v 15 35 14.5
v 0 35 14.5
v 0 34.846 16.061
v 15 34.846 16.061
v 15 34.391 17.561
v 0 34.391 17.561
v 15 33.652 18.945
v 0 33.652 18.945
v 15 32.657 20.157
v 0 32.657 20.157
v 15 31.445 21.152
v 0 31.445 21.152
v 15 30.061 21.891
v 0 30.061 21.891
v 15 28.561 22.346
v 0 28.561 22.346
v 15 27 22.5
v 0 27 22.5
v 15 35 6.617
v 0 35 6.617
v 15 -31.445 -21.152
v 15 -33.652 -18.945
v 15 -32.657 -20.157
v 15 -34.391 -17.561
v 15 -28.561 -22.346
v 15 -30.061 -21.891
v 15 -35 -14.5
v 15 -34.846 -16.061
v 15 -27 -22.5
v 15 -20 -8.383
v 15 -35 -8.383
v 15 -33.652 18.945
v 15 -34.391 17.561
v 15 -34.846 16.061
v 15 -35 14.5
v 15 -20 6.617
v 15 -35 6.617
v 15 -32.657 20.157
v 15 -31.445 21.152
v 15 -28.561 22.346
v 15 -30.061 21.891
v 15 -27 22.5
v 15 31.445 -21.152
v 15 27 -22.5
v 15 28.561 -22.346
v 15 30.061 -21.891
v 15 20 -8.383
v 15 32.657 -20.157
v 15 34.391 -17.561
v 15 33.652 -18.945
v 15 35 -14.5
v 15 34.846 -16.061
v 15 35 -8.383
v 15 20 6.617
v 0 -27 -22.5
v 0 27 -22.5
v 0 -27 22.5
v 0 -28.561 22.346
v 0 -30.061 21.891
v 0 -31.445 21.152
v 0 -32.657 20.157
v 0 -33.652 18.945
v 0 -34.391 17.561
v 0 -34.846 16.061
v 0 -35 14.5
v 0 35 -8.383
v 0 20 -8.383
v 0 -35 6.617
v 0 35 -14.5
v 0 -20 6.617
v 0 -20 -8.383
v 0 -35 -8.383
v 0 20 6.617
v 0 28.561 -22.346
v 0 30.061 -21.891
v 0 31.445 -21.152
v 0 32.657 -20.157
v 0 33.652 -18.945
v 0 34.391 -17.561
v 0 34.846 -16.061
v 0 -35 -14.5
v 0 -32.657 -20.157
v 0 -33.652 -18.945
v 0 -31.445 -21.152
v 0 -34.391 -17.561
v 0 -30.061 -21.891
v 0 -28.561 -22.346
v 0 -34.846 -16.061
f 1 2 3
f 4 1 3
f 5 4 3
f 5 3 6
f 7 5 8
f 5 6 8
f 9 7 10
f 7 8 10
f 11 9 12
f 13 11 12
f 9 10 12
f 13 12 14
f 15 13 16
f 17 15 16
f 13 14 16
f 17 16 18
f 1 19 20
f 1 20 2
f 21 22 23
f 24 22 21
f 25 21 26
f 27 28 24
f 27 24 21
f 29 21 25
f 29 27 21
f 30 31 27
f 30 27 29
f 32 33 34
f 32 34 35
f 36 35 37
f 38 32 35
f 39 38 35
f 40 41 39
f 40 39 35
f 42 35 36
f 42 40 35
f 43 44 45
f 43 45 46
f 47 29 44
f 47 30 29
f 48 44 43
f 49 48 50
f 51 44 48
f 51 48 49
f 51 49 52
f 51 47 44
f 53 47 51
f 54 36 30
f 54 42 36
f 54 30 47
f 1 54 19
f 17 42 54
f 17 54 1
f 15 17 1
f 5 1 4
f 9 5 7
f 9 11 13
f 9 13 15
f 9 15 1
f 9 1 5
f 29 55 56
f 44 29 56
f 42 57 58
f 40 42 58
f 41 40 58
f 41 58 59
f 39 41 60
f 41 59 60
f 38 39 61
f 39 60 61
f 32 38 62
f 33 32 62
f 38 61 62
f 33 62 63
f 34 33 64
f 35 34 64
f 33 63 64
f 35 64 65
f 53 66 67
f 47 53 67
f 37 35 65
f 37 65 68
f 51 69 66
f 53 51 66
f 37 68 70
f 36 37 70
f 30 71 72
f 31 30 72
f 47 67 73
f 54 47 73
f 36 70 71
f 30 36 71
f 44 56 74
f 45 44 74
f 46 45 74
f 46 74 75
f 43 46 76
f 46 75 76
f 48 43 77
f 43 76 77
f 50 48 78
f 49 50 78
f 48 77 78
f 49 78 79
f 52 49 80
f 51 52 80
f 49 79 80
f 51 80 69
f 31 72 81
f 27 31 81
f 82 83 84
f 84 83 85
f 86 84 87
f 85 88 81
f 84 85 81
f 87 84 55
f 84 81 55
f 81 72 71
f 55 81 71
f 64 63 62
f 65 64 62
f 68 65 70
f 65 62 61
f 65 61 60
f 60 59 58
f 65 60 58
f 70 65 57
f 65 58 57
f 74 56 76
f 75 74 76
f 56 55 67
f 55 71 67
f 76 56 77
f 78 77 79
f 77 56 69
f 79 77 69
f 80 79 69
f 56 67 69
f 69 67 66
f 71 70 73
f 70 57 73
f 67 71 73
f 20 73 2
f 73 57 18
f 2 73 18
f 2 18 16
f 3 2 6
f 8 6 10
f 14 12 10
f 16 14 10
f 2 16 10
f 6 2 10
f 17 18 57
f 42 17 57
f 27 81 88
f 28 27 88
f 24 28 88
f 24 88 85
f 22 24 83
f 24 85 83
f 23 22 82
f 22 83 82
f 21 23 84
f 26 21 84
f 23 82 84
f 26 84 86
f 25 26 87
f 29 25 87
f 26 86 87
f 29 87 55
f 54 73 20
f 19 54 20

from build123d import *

# Parameters (mm, degrees)
F1_DEPTH = 15


with BuildPart() as f1:
    # F0 (on Right) → F1 (new body)
    with BuildSketch(Plane.YZ):
        with BuildLine():
            ThreePointArc((35, 14.5), (32.656854, 20.156854), (27, 22.5))
            Line((27, 22.5), (-27, 22.5))
            ThreePointArc((-27, 22.5), (-32.656854, 20.156854), (-35, 14.5))
            Line((-35, 14.5), (-35, 6.617025))
            Line((-35, 6.617025), (-20, 6.617025))
            Line((-20, 6.617025), (-20, -8.382975))
            Line((-20, -8.382975), (-35, -8.382975))
            Line((-35, -8.382975), (-35, -14.5))
            ThreePointArc((-35, -14.5), (-32.656854, -20.156854), (-27, -22.5))
            Line((-27, -22.5), (27, -22.5))
            ThreePointArc((27, -22.5), (32.656854, -20.156854), (35, -14.5))
            Line((35, -14.5), (35, -8.382975))
            Line((35, -8.382975), (20, -8.382975))
            Line((20, -8.382975), (20, 6.617025))
            Line((20, 6.617025), (35, 6.617025))
            Line((35, 6.617025), (35, 14.5))
        make_face()
    extrude(amount=F1_DEPTH)


solid = f1.part
